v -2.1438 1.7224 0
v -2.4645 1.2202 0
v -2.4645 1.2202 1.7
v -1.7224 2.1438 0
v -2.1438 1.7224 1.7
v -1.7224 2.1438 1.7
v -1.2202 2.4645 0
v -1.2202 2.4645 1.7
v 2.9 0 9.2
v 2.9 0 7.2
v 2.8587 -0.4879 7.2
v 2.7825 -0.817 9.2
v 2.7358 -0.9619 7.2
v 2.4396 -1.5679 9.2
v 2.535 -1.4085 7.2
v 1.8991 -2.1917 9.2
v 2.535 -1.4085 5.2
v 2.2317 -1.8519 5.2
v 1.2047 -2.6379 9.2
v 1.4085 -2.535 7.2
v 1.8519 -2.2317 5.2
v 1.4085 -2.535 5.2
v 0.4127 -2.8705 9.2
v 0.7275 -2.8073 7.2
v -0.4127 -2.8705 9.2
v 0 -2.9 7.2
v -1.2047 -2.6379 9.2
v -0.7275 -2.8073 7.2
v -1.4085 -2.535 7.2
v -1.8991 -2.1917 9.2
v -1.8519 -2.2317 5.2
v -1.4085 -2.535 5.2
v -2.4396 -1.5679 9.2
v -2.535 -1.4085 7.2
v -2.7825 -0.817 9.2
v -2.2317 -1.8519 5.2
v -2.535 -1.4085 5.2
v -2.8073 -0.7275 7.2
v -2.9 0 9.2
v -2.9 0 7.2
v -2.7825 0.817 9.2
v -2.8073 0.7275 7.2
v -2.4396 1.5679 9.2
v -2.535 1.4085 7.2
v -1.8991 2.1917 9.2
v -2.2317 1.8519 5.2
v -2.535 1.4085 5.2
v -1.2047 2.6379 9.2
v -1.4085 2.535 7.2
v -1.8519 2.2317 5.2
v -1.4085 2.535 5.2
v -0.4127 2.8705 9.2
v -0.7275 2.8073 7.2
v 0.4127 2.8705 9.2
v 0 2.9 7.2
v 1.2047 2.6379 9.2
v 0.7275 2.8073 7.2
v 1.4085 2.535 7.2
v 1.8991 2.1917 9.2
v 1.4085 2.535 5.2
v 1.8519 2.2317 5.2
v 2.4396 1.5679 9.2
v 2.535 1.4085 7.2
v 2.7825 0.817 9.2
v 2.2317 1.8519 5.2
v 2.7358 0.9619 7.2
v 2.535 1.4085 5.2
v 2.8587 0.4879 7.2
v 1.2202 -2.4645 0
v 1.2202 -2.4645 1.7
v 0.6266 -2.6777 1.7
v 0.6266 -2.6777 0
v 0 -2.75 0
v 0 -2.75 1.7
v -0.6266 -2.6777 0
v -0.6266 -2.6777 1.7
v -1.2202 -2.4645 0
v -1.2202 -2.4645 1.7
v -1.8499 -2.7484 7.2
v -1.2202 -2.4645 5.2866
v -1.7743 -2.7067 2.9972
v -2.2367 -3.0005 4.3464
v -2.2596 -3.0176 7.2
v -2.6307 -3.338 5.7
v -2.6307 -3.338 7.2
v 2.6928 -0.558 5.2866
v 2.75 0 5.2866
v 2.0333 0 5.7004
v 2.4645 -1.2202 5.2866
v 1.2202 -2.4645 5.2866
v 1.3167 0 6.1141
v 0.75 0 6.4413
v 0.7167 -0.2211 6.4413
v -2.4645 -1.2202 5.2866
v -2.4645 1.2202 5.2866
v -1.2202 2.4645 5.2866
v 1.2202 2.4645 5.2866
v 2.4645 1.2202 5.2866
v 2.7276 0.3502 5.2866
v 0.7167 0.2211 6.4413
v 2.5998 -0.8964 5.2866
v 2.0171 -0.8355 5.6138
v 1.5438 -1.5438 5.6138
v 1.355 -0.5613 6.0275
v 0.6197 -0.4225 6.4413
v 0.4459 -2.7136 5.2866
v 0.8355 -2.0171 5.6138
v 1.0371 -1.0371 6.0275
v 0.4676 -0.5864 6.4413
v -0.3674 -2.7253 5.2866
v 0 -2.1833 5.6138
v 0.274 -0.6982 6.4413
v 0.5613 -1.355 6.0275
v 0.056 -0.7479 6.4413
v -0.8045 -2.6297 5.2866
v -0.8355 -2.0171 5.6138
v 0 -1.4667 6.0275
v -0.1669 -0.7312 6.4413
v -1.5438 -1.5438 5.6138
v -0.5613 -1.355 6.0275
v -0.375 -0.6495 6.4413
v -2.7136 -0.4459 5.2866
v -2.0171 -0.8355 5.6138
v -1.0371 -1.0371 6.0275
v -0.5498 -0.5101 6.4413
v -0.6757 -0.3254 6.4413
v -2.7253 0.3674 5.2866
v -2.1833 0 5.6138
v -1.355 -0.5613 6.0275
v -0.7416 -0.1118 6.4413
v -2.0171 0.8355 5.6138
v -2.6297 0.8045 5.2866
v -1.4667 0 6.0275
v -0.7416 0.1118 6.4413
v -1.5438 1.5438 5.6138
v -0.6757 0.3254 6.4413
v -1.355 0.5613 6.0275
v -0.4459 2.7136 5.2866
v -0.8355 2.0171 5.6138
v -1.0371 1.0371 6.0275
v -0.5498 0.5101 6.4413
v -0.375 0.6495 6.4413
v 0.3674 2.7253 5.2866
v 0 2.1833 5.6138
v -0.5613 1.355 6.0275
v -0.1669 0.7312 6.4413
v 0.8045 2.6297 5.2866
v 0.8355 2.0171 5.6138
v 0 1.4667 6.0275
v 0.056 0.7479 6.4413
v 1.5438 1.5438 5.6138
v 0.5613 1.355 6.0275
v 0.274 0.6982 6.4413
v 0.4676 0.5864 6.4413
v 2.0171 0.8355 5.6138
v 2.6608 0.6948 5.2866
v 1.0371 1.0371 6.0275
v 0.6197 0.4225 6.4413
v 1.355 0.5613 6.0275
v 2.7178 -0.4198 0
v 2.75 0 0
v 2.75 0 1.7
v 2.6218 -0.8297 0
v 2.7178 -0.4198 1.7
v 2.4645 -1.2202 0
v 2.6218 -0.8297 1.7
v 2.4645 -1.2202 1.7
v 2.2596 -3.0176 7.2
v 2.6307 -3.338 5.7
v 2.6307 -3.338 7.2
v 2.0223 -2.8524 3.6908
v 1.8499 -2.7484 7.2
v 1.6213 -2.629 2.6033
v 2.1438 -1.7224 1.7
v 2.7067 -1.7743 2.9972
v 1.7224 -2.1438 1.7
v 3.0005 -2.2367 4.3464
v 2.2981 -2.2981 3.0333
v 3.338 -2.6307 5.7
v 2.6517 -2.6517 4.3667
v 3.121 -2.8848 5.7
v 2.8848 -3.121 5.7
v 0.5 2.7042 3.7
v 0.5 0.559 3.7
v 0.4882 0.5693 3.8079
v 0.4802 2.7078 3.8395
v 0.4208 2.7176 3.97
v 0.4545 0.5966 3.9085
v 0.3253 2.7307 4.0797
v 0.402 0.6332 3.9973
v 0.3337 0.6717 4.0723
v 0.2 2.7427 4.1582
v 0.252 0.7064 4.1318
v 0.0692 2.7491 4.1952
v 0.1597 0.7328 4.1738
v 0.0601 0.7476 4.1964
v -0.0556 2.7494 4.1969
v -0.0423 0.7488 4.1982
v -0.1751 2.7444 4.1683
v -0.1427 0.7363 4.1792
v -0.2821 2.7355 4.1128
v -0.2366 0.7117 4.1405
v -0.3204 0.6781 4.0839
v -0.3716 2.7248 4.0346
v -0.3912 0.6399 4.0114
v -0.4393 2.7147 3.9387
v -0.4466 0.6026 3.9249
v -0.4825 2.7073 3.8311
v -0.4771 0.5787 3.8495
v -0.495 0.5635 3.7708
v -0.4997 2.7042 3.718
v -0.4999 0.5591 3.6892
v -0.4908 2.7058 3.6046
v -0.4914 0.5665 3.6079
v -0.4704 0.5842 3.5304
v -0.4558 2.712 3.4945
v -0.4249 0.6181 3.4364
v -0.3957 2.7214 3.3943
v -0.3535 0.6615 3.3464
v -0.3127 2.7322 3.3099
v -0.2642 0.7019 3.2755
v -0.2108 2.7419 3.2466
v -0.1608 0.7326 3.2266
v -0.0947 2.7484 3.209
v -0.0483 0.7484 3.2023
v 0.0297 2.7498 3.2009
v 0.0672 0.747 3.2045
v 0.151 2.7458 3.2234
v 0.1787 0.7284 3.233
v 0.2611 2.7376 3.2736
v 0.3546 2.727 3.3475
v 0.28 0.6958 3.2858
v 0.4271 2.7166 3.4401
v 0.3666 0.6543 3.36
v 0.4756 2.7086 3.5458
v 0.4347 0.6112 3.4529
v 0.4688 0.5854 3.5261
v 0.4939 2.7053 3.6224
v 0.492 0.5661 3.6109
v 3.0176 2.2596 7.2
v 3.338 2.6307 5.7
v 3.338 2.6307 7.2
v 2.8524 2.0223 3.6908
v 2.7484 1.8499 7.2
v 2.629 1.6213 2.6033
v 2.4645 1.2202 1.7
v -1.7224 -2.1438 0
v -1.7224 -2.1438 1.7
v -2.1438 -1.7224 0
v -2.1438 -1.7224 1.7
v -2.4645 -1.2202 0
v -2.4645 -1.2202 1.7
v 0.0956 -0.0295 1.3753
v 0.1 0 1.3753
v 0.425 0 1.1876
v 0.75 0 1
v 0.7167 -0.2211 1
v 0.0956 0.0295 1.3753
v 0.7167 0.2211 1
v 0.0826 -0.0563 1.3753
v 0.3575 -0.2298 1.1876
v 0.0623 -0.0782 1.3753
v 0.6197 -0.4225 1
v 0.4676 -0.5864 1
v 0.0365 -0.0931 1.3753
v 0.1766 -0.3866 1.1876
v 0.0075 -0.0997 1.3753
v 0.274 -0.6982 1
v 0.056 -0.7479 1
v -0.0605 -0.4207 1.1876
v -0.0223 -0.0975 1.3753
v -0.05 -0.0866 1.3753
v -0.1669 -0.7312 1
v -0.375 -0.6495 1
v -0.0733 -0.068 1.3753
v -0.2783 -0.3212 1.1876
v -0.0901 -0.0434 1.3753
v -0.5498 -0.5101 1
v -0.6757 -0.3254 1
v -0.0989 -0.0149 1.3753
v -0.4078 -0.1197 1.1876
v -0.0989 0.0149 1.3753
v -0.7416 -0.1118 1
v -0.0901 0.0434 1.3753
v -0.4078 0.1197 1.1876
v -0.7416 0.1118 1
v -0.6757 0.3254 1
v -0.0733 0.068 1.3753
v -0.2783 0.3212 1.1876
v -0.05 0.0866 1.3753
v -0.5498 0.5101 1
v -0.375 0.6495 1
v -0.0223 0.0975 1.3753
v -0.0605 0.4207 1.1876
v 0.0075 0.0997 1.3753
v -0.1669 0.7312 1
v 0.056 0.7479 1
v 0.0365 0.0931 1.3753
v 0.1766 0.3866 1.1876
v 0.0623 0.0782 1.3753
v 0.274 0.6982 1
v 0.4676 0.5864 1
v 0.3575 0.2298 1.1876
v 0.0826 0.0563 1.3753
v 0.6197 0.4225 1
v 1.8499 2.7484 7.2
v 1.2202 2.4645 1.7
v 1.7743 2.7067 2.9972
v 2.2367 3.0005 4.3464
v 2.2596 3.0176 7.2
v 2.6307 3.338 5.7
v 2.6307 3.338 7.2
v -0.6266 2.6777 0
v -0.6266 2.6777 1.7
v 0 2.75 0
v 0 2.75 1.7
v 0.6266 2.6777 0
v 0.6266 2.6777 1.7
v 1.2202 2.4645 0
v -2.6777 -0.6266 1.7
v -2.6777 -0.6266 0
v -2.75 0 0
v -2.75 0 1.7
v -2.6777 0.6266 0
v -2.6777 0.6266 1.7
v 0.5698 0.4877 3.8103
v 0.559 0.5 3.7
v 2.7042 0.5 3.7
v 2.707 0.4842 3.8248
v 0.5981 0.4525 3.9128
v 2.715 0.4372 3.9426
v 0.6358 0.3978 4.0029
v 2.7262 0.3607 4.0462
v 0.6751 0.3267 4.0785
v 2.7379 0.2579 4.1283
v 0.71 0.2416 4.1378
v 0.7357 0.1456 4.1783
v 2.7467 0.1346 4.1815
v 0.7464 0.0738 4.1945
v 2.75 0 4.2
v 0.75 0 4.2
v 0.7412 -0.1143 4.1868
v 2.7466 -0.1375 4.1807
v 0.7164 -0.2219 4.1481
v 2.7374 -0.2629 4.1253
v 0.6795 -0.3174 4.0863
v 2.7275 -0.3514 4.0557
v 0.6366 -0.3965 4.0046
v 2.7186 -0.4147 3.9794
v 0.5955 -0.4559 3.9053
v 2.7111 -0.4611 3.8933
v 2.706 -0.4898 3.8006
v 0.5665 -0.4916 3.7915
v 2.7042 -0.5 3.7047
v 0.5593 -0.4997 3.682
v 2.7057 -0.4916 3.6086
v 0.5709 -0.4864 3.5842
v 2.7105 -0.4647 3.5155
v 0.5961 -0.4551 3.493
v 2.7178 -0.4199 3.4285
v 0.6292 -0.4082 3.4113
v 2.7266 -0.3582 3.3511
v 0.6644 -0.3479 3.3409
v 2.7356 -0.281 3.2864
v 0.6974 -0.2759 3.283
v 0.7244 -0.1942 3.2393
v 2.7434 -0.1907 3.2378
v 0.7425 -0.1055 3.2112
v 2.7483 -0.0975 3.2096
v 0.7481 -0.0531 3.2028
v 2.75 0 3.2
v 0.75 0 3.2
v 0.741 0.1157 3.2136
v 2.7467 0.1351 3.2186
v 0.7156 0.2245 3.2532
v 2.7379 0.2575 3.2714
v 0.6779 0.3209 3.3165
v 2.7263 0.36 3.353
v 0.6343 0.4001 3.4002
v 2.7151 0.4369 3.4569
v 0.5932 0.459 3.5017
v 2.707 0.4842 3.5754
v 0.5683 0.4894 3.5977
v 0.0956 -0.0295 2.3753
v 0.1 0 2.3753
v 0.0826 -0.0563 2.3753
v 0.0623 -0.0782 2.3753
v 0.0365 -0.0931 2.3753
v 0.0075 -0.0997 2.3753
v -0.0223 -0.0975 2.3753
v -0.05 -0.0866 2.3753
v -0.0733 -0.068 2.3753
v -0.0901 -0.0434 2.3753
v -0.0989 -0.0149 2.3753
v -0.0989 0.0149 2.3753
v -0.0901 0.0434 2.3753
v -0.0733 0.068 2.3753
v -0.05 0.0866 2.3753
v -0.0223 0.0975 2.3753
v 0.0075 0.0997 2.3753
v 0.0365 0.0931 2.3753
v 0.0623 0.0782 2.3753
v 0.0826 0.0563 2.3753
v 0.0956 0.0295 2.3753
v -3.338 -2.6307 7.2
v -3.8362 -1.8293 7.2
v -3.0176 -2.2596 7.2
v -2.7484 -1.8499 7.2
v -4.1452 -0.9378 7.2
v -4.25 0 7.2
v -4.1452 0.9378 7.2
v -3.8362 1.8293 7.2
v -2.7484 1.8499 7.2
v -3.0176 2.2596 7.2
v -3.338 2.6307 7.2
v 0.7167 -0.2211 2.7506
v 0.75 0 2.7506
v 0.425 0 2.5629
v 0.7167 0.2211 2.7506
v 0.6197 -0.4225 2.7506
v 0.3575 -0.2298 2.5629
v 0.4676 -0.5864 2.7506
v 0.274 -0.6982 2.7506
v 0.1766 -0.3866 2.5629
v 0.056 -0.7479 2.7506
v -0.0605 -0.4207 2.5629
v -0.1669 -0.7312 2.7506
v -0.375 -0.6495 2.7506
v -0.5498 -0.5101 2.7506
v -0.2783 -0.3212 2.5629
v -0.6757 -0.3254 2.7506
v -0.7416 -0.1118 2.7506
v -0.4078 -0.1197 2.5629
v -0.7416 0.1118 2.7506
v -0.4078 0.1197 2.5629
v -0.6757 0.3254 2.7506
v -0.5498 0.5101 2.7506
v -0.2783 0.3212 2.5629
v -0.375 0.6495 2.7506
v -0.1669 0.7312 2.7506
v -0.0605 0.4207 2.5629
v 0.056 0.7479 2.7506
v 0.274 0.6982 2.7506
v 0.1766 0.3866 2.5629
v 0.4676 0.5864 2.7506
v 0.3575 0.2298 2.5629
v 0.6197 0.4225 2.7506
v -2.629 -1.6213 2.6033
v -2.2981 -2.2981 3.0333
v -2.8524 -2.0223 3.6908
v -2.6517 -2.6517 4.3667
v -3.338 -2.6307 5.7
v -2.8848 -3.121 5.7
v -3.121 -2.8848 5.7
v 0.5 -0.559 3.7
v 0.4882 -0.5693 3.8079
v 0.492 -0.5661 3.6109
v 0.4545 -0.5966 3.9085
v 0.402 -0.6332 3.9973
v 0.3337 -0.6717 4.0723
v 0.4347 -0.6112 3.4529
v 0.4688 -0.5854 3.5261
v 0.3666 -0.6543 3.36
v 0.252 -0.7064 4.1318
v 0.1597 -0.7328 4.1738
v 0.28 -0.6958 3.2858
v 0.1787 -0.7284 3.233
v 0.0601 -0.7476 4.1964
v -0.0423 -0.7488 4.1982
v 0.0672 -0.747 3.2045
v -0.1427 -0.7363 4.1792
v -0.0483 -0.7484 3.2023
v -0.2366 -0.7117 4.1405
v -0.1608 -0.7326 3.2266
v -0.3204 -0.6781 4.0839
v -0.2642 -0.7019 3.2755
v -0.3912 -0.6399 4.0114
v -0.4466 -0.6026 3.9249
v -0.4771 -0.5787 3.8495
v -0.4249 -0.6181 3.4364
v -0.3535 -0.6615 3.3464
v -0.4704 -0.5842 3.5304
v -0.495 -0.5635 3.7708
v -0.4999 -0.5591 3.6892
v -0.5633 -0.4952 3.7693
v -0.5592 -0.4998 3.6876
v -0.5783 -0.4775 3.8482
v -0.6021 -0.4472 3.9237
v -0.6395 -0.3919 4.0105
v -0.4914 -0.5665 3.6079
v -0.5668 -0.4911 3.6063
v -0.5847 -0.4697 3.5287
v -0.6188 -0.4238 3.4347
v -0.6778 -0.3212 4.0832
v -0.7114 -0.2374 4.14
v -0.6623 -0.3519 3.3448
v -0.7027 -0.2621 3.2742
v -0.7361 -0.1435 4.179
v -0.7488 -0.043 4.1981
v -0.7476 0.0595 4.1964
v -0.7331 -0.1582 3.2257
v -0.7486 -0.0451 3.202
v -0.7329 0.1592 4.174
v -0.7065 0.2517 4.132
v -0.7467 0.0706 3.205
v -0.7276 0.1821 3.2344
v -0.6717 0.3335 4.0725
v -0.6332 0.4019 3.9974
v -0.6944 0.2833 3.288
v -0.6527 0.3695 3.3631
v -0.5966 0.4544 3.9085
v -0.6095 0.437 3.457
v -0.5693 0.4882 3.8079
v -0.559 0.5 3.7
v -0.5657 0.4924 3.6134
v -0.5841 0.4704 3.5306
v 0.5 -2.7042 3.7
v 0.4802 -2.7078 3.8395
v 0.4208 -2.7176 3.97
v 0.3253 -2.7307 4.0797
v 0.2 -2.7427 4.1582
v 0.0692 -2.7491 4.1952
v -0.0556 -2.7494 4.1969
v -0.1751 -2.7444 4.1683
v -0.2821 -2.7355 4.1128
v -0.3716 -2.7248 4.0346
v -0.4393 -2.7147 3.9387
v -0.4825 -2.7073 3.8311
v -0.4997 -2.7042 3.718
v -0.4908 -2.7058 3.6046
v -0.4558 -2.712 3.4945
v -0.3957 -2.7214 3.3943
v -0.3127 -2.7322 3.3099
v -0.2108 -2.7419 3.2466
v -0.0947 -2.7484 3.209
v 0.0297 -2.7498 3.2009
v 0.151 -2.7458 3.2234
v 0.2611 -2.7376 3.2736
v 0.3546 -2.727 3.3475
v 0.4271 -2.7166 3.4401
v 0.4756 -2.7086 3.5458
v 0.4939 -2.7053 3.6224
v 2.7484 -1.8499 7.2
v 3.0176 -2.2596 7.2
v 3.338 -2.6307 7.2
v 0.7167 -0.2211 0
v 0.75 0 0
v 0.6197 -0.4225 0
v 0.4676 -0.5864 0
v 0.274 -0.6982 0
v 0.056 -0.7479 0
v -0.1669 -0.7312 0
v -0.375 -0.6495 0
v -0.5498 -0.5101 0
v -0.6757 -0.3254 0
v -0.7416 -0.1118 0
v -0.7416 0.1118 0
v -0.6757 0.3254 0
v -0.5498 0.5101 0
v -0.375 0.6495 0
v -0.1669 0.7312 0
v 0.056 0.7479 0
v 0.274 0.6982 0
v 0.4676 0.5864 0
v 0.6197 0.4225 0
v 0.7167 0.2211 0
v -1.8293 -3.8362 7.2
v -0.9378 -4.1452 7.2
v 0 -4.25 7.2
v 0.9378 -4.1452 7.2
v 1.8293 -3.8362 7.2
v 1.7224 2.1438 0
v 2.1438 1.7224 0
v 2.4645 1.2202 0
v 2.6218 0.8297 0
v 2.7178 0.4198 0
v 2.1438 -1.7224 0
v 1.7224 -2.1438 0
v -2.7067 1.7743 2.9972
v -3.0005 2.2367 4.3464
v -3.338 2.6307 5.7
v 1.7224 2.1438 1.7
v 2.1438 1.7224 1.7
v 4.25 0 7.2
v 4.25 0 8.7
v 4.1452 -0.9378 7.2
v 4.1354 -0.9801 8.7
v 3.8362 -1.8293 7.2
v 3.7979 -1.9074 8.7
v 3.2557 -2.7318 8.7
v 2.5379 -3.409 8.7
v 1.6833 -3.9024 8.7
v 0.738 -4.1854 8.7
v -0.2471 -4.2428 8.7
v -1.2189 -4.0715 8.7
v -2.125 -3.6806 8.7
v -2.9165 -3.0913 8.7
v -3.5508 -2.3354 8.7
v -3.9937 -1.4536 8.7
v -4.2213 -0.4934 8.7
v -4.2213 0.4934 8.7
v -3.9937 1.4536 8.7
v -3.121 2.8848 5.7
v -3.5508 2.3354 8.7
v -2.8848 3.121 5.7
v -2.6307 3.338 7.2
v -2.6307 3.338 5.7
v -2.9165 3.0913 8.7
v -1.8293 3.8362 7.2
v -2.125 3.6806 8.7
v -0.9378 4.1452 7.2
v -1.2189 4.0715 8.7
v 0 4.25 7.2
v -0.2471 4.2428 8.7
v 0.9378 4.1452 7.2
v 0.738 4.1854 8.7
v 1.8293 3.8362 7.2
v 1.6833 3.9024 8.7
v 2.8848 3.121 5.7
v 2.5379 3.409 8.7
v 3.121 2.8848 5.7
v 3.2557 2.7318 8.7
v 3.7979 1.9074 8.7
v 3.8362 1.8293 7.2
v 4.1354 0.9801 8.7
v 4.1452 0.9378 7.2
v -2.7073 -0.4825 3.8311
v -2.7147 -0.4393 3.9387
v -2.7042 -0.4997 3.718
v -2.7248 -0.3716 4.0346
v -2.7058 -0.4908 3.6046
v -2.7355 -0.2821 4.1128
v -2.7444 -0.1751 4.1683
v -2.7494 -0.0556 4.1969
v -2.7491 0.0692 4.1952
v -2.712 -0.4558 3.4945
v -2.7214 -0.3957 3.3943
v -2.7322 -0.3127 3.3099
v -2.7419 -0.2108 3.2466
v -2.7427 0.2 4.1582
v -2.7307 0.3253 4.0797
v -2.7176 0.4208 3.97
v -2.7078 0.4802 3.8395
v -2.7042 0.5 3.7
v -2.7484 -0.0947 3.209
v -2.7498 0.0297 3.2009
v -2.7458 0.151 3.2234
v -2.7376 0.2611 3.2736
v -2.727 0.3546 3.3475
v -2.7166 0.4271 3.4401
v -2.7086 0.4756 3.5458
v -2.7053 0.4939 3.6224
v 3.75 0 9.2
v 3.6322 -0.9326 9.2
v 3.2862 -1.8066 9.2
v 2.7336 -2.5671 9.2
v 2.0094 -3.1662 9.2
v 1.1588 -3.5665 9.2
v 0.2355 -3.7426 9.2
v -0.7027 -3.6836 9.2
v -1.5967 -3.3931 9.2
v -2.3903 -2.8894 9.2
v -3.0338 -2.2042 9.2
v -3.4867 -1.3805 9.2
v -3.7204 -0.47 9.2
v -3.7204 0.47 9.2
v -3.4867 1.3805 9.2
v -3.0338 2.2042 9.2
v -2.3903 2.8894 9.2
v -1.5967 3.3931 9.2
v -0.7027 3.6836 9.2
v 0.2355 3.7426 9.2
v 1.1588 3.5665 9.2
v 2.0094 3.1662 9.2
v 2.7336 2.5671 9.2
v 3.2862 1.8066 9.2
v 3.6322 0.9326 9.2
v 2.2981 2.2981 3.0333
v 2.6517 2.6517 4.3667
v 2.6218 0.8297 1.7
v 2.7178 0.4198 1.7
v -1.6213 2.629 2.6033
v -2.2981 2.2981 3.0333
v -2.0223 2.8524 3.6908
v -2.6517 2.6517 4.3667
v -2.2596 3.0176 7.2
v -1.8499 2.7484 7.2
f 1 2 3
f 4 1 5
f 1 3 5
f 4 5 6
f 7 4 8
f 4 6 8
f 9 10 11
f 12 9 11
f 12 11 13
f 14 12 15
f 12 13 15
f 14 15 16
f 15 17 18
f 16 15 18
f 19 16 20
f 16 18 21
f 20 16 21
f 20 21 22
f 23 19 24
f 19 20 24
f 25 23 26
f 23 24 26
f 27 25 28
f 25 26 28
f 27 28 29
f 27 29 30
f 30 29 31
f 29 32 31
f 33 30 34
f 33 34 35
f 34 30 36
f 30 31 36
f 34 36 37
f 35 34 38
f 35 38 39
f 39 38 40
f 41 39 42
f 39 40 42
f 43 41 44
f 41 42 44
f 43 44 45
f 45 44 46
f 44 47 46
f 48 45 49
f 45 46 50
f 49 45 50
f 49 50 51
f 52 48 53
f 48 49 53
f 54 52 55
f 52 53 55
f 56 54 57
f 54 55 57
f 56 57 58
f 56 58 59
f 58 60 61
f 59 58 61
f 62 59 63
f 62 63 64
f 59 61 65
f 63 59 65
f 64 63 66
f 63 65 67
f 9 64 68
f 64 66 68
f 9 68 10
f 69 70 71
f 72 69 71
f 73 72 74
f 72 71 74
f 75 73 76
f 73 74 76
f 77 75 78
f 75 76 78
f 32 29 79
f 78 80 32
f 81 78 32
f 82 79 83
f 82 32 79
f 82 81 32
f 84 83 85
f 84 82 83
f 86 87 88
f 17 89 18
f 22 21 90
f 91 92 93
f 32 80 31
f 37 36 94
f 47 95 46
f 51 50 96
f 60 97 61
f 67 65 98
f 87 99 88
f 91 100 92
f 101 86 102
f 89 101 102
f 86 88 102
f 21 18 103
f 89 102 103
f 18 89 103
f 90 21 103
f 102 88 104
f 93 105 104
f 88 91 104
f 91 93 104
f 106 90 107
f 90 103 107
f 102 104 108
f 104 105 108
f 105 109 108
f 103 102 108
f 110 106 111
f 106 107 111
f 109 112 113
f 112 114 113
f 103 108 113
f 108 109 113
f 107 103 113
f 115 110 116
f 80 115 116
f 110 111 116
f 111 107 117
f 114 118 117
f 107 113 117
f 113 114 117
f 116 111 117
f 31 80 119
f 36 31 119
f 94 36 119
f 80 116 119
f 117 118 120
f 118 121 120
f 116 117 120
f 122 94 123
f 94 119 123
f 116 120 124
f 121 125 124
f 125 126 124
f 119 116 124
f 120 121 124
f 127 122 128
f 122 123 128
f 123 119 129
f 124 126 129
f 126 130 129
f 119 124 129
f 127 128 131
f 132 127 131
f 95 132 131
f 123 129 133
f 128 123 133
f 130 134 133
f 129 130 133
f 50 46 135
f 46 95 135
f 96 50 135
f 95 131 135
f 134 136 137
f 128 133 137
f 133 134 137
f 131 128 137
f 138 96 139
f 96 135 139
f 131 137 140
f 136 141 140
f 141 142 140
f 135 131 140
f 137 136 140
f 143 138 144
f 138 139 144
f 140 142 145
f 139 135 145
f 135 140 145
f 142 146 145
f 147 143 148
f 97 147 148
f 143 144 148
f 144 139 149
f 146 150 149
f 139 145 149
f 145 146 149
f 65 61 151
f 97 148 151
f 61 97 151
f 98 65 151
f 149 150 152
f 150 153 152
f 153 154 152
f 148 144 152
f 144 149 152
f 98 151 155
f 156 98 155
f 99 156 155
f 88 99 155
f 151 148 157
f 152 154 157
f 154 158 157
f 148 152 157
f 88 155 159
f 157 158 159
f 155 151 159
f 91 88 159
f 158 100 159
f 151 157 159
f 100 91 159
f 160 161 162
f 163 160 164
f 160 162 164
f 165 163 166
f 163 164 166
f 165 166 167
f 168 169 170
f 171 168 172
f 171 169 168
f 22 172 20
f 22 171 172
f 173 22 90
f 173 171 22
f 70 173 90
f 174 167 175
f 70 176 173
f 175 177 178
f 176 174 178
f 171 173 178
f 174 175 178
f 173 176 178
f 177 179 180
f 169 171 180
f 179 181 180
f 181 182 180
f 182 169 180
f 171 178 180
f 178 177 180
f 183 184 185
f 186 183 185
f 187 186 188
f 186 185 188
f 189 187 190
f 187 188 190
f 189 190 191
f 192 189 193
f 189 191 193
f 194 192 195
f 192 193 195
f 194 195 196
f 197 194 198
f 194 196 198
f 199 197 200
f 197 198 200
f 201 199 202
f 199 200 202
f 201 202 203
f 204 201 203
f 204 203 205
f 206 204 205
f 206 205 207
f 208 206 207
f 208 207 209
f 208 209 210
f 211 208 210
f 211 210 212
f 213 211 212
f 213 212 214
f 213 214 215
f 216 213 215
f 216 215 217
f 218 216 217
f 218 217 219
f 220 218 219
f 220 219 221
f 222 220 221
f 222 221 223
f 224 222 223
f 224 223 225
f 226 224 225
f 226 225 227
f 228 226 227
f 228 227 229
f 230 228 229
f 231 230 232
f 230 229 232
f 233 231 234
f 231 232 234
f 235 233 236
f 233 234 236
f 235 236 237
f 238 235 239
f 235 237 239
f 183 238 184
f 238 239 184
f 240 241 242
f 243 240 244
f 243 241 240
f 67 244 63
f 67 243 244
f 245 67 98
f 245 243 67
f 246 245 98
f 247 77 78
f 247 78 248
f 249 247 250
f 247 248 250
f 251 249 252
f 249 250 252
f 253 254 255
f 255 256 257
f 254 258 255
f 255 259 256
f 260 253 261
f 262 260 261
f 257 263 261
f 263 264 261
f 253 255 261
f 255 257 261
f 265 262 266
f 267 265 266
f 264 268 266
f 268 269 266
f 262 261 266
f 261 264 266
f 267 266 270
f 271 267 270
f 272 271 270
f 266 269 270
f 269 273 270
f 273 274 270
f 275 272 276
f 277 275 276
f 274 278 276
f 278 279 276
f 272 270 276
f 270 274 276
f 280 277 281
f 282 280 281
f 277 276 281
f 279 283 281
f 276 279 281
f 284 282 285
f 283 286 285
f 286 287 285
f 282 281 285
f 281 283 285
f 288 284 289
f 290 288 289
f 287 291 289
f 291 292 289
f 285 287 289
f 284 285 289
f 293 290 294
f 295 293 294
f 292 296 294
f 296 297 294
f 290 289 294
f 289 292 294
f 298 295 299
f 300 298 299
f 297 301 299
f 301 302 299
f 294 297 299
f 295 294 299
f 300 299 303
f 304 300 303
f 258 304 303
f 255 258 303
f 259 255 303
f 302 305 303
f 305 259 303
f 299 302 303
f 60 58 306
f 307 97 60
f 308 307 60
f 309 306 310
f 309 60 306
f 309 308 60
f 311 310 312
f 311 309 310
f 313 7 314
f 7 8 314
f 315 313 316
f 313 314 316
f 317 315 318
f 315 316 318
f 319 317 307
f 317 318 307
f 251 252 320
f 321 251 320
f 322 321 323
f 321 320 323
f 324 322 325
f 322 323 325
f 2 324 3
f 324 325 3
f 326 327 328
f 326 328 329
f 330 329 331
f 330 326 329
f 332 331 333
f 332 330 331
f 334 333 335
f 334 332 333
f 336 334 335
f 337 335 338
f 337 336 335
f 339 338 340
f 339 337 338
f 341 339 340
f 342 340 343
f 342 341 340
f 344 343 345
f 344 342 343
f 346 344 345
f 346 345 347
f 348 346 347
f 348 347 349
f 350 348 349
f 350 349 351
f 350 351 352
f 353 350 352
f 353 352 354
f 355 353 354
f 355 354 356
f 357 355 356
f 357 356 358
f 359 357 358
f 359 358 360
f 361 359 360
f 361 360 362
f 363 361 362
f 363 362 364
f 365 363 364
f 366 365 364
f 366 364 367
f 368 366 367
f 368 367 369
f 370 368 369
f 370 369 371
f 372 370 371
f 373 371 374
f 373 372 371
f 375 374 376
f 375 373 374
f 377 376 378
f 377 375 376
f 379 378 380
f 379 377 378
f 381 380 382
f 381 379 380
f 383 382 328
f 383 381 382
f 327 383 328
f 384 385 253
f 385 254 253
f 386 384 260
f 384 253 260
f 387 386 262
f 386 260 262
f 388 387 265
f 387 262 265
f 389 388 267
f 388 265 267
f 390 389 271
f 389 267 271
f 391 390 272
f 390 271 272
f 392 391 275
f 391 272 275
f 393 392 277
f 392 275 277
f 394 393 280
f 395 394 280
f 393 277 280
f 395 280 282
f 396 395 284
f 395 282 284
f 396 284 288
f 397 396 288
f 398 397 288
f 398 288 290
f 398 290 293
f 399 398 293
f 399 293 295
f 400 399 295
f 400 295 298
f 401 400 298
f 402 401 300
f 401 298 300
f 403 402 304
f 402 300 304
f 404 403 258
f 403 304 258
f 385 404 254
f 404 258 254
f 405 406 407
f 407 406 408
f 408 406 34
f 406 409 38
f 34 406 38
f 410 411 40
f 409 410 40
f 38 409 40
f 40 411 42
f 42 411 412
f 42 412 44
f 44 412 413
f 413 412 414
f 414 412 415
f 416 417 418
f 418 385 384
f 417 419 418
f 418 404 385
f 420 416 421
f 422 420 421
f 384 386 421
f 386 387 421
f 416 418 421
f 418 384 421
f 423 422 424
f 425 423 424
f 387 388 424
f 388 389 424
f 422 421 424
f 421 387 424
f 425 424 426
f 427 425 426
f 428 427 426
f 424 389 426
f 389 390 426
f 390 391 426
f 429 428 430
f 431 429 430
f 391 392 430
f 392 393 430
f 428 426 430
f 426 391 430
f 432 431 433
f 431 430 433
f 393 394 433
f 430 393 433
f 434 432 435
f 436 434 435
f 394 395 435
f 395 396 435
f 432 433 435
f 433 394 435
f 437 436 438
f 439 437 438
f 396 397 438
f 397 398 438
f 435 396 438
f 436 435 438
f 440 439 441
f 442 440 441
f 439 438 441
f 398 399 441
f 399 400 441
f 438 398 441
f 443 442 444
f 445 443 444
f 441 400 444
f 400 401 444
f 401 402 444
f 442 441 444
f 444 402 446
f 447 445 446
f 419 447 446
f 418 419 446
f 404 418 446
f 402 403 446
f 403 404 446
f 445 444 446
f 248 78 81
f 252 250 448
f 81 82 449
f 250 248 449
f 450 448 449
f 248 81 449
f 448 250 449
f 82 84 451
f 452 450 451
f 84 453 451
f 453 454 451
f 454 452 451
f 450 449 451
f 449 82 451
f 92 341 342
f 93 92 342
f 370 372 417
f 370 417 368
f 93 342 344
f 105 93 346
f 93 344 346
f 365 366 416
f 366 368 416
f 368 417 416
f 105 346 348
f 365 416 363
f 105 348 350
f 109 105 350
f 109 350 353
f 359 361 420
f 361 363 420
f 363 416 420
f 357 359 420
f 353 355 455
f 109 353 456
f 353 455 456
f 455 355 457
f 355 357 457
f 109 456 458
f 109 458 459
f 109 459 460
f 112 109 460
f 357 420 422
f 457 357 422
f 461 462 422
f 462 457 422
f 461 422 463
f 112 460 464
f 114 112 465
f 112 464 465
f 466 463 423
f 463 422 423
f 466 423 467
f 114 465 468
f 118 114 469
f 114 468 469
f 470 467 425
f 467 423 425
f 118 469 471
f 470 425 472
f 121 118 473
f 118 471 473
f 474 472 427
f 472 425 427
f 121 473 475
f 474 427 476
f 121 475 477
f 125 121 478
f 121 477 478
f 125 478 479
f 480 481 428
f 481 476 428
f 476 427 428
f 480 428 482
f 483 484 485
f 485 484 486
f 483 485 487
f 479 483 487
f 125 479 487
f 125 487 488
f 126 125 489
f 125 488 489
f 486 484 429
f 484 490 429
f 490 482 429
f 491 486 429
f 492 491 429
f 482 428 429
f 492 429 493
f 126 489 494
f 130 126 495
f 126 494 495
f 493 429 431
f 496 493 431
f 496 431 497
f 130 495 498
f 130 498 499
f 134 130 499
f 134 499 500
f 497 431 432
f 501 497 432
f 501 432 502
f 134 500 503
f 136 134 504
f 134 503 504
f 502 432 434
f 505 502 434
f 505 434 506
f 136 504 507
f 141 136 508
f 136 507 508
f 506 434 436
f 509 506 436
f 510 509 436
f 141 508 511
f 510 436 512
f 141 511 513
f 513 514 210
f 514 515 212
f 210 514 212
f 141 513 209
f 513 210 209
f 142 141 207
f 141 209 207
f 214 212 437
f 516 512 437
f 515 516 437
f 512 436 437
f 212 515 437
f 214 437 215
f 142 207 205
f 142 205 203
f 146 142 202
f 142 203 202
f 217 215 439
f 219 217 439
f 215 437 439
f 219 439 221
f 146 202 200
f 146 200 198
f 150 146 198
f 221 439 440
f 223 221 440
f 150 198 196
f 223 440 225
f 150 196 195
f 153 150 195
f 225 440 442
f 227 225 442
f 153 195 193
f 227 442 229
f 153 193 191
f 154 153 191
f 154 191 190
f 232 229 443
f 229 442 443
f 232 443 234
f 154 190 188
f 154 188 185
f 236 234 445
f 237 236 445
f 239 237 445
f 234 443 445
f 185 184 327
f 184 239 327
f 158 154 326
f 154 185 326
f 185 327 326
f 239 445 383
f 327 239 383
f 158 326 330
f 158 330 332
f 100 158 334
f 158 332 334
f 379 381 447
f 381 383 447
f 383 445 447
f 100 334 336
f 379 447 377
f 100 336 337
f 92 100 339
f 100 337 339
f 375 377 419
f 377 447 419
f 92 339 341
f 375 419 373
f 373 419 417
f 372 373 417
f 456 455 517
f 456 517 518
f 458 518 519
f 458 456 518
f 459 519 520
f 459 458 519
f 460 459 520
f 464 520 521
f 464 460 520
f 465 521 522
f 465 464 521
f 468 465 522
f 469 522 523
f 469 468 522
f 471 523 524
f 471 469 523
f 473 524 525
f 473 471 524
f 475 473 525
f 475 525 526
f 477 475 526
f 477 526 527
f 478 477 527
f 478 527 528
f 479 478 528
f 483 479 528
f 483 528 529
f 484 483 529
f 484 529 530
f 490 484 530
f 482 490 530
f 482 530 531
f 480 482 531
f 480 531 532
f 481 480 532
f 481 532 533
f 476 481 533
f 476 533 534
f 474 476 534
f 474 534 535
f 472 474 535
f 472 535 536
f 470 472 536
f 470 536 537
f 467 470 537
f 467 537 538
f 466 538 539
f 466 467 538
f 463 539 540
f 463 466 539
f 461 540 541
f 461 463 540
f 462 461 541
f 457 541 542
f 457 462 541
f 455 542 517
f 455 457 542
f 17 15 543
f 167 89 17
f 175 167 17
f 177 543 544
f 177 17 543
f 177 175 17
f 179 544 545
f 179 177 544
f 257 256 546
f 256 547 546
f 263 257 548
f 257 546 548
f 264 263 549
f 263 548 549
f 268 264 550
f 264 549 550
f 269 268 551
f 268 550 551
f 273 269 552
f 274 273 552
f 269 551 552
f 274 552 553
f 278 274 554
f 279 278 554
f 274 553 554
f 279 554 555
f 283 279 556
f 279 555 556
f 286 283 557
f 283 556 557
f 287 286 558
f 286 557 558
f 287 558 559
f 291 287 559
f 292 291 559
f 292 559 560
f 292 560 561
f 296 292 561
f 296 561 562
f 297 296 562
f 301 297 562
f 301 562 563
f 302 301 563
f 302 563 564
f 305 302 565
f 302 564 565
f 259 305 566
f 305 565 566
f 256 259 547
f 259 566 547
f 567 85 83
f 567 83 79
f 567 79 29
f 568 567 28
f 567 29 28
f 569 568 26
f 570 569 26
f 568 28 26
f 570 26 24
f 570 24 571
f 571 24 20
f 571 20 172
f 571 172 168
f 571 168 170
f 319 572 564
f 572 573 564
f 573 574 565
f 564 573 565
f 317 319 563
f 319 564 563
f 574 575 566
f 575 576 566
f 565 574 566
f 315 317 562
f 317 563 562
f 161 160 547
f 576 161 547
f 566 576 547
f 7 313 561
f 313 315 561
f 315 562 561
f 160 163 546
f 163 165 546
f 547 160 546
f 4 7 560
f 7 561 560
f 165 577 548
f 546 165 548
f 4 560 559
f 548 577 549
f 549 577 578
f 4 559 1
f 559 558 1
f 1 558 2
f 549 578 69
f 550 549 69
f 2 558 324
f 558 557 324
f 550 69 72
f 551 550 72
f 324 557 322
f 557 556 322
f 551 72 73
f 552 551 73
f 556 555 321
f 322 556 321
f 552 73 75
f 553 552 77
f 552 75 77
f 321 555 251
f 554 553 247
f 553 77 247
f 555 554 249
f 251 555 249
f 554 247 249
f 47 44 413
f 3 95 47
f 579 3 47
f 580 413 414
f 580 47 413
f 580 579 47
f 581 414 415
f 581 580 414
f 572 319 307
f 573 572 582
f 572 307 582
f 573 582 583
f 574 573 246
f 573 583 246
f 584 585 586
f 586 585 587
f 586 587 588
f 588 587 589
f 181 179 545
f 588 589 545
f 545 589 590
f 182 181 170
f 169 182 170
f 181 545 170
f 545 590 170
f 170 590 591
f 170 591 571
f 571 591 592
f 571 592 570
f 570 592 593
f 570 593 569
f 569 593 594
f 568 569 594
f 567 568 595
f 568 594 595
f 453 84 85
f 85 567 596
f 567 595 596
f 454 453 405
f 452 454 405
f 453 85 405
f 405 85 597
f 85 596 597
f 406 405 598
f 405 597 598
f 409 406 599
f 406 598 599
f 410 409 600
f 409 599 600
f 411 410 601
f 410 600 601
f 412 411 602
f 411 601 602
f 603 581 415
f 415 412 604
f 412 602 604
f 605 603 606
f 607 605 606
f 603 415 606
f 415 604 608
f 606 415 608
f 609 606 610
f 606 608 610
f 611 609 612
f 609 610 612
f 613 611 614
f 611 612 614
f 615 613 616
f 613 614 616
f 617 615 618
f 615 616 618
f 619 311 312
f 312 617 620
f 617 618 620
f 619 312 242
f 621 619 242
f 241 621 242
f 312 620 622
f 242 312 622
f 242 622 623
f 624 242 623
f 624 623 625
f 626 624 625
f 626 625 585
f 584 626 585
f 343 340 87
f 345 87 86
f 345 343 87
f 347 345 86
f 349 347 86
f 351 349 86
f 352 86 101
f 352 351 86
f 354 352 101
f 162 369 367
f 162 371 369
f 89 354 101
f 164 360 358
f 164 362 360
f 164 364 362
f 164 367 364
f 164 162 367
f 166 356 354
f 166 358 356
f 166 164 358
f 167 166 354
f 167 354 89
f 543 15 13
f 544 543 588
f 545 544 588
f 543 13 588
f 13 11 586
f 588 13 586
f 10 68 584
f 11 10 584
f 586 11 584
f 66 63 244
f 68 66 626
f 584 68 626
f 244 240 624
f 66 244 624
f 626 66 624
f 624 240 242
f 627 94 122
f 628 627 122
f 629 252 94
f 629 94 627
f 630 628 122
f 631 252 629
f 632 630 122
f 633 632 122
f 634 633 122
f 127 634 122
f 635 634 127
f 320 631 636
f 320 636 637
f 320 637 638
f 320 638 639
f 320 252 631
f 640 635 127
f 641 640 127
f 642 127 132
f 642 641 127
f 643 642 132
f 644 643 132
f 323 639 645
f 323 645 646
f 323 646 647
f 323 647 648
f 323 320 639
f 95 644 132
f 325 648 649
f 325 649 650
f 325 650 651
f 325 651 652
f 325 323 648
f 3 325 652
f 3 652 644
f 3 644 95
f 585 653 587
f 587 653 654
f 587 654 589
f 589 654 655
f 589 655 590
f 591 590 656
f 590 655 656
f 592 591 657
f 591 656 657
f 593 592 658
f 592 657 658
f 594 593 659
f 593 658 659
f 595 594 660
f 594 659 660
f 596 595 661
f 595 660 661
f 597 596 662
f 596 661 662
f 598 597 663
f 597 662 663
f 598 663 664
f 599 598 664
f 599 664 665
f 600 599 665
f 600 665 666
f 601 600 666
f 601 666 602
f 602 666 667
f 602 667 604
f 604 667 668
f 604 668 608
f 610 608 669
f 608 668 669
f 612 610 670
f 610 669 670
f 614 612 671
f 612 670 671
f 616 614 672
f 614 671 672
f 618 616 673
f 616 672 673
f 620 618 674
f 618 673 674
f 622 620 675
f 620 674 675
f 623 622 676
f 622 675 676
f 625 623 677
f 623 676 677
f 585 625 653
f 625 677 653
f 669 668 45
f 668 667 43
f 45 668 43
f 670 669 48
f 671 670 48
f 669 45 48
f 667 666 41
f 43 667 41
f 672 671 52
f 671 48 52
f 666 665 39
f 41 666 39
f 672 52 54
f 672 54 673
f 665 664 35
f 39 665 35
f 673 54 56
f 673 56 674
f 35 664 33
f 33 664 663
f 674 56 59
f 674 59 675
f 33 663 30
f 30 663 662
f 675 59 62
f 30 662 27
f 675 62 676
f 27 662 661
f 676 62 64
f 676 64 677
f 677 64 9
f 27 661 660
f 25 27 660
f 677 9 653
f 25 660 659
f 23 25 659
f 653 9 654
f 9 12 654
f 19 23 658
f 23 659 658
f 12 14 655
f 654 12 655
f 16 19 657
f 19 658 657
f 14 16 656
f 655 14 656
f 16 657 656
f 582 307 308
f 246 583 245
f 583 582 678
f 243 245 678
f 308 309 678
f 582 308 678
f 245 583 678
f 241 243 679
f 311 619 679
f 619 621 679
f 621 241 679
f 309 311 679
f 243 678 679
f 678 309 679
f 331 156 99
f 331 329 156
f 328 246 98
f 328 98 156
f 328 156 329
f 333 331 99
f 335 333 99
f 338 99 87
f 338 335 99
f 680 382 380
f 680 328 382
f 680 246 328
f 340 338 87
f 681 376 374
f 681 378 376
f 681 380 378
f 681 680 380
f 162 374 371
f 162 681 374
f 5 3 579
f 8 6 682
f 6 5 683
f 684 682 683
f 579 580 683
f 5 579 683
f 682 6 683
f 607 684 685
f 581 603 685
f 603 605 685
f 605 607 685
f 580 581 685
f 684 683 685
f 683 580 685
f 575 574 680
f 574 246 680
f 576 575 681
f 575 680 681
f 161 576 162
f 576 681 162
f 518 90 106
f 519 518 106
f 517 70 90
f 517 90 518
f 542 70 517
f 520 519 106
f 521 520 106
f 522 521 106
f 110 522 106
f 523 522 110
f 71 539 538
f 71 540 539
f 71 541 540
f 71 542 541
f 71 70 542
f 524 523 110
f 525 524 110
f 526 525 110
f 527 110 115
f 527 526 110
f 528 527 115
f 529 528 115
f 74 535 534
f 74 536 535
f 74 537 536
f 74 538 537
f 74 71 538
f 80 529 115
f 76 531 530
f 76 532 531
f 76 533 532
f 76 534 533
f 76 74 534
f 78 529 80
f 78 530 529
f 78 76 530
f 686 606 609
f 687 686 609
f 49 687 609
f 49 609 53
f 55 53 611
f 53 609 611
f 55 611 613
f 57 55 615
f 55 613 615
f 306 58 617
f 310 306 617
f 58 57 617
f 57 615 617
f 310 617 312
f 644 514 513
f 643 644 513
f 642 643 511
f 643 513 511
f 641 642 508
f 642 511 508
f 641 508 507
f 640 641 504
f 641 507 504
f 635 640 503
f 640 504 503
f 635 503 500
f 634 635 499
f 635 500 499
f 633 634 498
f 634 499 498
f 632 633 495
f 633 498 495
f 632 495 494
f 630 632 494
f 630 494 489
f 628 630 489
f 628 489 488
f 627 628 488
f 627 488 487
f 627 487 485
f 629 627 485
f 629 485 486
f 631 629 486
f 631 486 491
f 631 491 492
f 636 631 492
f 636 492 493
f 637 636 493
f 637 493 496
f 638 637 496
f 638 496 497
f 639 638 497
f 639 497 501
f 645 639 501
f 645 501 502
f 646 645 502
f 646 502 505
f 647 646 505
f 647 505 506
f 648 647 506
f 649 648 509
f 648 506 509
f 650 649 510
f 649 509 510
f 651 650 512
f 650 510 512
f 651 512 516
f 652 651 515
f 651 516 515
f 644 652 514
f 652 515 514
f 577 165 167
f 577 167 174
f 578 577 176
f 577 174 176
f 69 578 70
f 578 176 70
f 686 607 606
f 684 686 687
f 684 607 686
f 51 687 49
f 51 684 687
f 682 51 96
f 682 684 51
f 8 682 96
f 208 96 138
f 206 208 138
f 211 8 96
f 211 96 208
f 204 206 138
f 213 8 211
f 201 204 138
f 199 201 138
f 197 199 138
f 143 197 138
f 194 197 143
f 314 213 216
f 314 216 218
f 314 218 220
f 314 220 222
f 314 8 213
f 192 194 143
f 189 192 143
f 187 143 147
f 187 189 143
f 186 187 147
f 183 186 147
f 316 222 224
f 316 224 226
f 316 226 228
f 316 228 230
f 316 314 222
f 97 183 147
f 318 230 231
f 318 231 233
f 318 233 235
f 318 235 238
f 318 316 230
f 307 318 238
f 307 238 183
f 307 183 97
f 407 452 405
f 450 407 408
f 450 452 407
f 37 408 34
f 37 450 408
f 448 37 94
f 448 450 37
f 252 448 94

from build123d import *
from build123d import SkipClean  # not in build123d's __all__

# Parameters (mm, degrees)
F2_R          = 0.5
F3_DEPTH      = 4.251
F3_DEPTH_BACK = 4.251
F4_R          = 0.5
F5_DEPTH      = 4.2510001
F5_DEPTH_BACK = 4.2510001
F7_DEPTH      = 7.2
F8_SIZE2      = 0.5
F8_SIZE       = 0.5


with BuildPart() as f1:
    # F0 (on Front) → F1 (revolve)
    with BuildSketch(Plane.XZ):
        Polygon((0.75, 1), (0.75, 0), (2.75, 0), (2.75, 1.7), (4.25, 5.7), (4.25, 9.2), (2.9, 9.2), (2.9, 5.2), (0.75, 6.4413030788), (0.75, 2.7505553499), (0.1, 2.375277675), (0.1, 1.375277675), align=None)
    revolve(axis=Axis((0, 0, 4.6), (0, 0, -1)))

    # F2 (on Front) → F3 (cut, two sides)
    with BuildSketch(Plane.XZ) as f3_sk:
        with Locations((0, 3.7)):
            Circle(F2_R)
    extrude(amount=-F3_DEPTH, mode=Mode.SUBTRACT)
    extrude(f3_sk.sketch, amount=F3_DEPTH_BACK, mode=Mode.SUBTRACT)

    # F4 (on Right) → F5 (cut, two sides)
    with BuildSketch(Plane.YZ) as f5_sk:
        with Locations((0, 3.7)):
            Circle(F4_R)
    extrude(amount=-F5_DEPTH, mode=Mode.SUBTRACT)
    extrude(f5_sk.sketch, amount=F5_DEPTH_BACK, mode=Mode.SUBTRACT)

    # F6 (on Top) → F7 (cut)
    with BuildSketch(Plane.XY):
        with BuildLine():
            ThreePointArc((2.6516504294, 3.3587572106), (3.1943648253, 4.0460926544), (3.5628585232, 4.8405618624))
            ThreePointArc((3.5628585232, 4.8405618624), (1.875, 5.7104618903), (0, 6.0104076401))
            Line((0, 6.0104076401), (2.6516504294, 3.3587572106))
        make_face()
        with BuildLine():
            ThreePointArc((1.2201895167, 2.464475105), (1.9868873303, 2.8300336469), (2.6516504294, 3.3587572106))
            Line((2.6516504294, 3.3587572106), (0, 6.0104076401))
            ThreePointArc((0, 6.0104076401), (-1.875, 5.7104618903), (-3.5628585232, 4.8405618624))
            ThreePointArc((-3.5628585232, 4.8405618624), (-2.6703621866, 3.3776019518), (-1.2201895167, 2.464475105))
            ThreePointArc((-1.2201895167, 2.464475105), (0, 2.75), (1.2201895167, 2.464475105))
        make_face()
        with BuildLine():
            ThreePointArc((-3.5628585232, -4.8405618624), (0, -6.0104076401), (3.5628585232, -4.8405618624))
            ThreePointArc((3.5628585232, -4.8405618624), (2.6703621866, -3.3776019518), (1.2201895167, -2.464475105))
            ThreePointArc((1.2201895167, -2.464475105), (0, -2.75), (-1.2201895167, -2.464475105))
            ThreePointArc((-1.2201895167, -2.464475105), (-2.6703621866, -3.3776019518), (-3.5628585232, -4.8405618624))
        make_face()
        with BuildLine():
            ThreePointArc((-4.8405618624, 3.5628585232), (-6.0104076401, 0), (-4.8405618624, -3.5628585232))
            ThreePointArc((-4.8405618624, -3.5628585232), (-3.3776019518, -2.6703621866), (-2.464475105, -1.2201895167))
            ThreePointArc((-2.464475105, -1.2201895167), (-2.75, 0), (-2.464475105, 1.2201895167))
            ThreePointArc((-2.464475105, 1.2201895167), (-3.3776019518, 2.6703621866), (-4.8405618624, 3.5628585232))
        make_face()
        with BuildLine():
            Line((3.3587572106, 2.6516504294), (6.0104076401, 0))
            ThreePointArc((6.0104076401, 0), (5.7104618903, 1.875), (4.8405618624, 3.5628585232))
            ThreePointArc((4.8405618624, 3.5628585232), (4.0460926544, 3.1943648253), (3.3587572106, 2.6516504294))
        make_face()
        with BuildLine():
            ThreePointArc((4.8405618624, -3.5628585232), (5.7104618903, -1.875), (6.0104076401, 0))
            Line((6.0104076401, 0), (3.3587572106, 2.6516504294))
            ThreePointArc((3.3587572106, 2.6516504294), (2.8300336469, 1.9868873303), (2.464475105, 1.2201895167))
            ThreePointArc((2.464475105, 1.2201895167), (2.6776675054, 0.626575399), (2.75, 0))
            ThreePointArc((2.75, 0), (2.6776675054, -0.626575399), (2.464475105, -1.2201895167))
            ThreePointArc((2.464475105, -1.2201895167), (3.3776019518, -2.6703621866), (4.8405618624, -3.5628585232))
        make_face()
    with SkipClean():  # cleaning this boolean's faces spoils the solid; the shape is the same uncleaned
        extrude(amount=F7_DEPTH, mode=Mode.SUBTRACT)

    # F8
    f8_edges = [f1.edges().sort_by_distance(p)[0] for p in [
        (-4.25, 0, 9.2),
    ]]
    chamfer(f8_edges, length=F8_SIZE, length2=F8_SIZE2)


solid = f1.part
